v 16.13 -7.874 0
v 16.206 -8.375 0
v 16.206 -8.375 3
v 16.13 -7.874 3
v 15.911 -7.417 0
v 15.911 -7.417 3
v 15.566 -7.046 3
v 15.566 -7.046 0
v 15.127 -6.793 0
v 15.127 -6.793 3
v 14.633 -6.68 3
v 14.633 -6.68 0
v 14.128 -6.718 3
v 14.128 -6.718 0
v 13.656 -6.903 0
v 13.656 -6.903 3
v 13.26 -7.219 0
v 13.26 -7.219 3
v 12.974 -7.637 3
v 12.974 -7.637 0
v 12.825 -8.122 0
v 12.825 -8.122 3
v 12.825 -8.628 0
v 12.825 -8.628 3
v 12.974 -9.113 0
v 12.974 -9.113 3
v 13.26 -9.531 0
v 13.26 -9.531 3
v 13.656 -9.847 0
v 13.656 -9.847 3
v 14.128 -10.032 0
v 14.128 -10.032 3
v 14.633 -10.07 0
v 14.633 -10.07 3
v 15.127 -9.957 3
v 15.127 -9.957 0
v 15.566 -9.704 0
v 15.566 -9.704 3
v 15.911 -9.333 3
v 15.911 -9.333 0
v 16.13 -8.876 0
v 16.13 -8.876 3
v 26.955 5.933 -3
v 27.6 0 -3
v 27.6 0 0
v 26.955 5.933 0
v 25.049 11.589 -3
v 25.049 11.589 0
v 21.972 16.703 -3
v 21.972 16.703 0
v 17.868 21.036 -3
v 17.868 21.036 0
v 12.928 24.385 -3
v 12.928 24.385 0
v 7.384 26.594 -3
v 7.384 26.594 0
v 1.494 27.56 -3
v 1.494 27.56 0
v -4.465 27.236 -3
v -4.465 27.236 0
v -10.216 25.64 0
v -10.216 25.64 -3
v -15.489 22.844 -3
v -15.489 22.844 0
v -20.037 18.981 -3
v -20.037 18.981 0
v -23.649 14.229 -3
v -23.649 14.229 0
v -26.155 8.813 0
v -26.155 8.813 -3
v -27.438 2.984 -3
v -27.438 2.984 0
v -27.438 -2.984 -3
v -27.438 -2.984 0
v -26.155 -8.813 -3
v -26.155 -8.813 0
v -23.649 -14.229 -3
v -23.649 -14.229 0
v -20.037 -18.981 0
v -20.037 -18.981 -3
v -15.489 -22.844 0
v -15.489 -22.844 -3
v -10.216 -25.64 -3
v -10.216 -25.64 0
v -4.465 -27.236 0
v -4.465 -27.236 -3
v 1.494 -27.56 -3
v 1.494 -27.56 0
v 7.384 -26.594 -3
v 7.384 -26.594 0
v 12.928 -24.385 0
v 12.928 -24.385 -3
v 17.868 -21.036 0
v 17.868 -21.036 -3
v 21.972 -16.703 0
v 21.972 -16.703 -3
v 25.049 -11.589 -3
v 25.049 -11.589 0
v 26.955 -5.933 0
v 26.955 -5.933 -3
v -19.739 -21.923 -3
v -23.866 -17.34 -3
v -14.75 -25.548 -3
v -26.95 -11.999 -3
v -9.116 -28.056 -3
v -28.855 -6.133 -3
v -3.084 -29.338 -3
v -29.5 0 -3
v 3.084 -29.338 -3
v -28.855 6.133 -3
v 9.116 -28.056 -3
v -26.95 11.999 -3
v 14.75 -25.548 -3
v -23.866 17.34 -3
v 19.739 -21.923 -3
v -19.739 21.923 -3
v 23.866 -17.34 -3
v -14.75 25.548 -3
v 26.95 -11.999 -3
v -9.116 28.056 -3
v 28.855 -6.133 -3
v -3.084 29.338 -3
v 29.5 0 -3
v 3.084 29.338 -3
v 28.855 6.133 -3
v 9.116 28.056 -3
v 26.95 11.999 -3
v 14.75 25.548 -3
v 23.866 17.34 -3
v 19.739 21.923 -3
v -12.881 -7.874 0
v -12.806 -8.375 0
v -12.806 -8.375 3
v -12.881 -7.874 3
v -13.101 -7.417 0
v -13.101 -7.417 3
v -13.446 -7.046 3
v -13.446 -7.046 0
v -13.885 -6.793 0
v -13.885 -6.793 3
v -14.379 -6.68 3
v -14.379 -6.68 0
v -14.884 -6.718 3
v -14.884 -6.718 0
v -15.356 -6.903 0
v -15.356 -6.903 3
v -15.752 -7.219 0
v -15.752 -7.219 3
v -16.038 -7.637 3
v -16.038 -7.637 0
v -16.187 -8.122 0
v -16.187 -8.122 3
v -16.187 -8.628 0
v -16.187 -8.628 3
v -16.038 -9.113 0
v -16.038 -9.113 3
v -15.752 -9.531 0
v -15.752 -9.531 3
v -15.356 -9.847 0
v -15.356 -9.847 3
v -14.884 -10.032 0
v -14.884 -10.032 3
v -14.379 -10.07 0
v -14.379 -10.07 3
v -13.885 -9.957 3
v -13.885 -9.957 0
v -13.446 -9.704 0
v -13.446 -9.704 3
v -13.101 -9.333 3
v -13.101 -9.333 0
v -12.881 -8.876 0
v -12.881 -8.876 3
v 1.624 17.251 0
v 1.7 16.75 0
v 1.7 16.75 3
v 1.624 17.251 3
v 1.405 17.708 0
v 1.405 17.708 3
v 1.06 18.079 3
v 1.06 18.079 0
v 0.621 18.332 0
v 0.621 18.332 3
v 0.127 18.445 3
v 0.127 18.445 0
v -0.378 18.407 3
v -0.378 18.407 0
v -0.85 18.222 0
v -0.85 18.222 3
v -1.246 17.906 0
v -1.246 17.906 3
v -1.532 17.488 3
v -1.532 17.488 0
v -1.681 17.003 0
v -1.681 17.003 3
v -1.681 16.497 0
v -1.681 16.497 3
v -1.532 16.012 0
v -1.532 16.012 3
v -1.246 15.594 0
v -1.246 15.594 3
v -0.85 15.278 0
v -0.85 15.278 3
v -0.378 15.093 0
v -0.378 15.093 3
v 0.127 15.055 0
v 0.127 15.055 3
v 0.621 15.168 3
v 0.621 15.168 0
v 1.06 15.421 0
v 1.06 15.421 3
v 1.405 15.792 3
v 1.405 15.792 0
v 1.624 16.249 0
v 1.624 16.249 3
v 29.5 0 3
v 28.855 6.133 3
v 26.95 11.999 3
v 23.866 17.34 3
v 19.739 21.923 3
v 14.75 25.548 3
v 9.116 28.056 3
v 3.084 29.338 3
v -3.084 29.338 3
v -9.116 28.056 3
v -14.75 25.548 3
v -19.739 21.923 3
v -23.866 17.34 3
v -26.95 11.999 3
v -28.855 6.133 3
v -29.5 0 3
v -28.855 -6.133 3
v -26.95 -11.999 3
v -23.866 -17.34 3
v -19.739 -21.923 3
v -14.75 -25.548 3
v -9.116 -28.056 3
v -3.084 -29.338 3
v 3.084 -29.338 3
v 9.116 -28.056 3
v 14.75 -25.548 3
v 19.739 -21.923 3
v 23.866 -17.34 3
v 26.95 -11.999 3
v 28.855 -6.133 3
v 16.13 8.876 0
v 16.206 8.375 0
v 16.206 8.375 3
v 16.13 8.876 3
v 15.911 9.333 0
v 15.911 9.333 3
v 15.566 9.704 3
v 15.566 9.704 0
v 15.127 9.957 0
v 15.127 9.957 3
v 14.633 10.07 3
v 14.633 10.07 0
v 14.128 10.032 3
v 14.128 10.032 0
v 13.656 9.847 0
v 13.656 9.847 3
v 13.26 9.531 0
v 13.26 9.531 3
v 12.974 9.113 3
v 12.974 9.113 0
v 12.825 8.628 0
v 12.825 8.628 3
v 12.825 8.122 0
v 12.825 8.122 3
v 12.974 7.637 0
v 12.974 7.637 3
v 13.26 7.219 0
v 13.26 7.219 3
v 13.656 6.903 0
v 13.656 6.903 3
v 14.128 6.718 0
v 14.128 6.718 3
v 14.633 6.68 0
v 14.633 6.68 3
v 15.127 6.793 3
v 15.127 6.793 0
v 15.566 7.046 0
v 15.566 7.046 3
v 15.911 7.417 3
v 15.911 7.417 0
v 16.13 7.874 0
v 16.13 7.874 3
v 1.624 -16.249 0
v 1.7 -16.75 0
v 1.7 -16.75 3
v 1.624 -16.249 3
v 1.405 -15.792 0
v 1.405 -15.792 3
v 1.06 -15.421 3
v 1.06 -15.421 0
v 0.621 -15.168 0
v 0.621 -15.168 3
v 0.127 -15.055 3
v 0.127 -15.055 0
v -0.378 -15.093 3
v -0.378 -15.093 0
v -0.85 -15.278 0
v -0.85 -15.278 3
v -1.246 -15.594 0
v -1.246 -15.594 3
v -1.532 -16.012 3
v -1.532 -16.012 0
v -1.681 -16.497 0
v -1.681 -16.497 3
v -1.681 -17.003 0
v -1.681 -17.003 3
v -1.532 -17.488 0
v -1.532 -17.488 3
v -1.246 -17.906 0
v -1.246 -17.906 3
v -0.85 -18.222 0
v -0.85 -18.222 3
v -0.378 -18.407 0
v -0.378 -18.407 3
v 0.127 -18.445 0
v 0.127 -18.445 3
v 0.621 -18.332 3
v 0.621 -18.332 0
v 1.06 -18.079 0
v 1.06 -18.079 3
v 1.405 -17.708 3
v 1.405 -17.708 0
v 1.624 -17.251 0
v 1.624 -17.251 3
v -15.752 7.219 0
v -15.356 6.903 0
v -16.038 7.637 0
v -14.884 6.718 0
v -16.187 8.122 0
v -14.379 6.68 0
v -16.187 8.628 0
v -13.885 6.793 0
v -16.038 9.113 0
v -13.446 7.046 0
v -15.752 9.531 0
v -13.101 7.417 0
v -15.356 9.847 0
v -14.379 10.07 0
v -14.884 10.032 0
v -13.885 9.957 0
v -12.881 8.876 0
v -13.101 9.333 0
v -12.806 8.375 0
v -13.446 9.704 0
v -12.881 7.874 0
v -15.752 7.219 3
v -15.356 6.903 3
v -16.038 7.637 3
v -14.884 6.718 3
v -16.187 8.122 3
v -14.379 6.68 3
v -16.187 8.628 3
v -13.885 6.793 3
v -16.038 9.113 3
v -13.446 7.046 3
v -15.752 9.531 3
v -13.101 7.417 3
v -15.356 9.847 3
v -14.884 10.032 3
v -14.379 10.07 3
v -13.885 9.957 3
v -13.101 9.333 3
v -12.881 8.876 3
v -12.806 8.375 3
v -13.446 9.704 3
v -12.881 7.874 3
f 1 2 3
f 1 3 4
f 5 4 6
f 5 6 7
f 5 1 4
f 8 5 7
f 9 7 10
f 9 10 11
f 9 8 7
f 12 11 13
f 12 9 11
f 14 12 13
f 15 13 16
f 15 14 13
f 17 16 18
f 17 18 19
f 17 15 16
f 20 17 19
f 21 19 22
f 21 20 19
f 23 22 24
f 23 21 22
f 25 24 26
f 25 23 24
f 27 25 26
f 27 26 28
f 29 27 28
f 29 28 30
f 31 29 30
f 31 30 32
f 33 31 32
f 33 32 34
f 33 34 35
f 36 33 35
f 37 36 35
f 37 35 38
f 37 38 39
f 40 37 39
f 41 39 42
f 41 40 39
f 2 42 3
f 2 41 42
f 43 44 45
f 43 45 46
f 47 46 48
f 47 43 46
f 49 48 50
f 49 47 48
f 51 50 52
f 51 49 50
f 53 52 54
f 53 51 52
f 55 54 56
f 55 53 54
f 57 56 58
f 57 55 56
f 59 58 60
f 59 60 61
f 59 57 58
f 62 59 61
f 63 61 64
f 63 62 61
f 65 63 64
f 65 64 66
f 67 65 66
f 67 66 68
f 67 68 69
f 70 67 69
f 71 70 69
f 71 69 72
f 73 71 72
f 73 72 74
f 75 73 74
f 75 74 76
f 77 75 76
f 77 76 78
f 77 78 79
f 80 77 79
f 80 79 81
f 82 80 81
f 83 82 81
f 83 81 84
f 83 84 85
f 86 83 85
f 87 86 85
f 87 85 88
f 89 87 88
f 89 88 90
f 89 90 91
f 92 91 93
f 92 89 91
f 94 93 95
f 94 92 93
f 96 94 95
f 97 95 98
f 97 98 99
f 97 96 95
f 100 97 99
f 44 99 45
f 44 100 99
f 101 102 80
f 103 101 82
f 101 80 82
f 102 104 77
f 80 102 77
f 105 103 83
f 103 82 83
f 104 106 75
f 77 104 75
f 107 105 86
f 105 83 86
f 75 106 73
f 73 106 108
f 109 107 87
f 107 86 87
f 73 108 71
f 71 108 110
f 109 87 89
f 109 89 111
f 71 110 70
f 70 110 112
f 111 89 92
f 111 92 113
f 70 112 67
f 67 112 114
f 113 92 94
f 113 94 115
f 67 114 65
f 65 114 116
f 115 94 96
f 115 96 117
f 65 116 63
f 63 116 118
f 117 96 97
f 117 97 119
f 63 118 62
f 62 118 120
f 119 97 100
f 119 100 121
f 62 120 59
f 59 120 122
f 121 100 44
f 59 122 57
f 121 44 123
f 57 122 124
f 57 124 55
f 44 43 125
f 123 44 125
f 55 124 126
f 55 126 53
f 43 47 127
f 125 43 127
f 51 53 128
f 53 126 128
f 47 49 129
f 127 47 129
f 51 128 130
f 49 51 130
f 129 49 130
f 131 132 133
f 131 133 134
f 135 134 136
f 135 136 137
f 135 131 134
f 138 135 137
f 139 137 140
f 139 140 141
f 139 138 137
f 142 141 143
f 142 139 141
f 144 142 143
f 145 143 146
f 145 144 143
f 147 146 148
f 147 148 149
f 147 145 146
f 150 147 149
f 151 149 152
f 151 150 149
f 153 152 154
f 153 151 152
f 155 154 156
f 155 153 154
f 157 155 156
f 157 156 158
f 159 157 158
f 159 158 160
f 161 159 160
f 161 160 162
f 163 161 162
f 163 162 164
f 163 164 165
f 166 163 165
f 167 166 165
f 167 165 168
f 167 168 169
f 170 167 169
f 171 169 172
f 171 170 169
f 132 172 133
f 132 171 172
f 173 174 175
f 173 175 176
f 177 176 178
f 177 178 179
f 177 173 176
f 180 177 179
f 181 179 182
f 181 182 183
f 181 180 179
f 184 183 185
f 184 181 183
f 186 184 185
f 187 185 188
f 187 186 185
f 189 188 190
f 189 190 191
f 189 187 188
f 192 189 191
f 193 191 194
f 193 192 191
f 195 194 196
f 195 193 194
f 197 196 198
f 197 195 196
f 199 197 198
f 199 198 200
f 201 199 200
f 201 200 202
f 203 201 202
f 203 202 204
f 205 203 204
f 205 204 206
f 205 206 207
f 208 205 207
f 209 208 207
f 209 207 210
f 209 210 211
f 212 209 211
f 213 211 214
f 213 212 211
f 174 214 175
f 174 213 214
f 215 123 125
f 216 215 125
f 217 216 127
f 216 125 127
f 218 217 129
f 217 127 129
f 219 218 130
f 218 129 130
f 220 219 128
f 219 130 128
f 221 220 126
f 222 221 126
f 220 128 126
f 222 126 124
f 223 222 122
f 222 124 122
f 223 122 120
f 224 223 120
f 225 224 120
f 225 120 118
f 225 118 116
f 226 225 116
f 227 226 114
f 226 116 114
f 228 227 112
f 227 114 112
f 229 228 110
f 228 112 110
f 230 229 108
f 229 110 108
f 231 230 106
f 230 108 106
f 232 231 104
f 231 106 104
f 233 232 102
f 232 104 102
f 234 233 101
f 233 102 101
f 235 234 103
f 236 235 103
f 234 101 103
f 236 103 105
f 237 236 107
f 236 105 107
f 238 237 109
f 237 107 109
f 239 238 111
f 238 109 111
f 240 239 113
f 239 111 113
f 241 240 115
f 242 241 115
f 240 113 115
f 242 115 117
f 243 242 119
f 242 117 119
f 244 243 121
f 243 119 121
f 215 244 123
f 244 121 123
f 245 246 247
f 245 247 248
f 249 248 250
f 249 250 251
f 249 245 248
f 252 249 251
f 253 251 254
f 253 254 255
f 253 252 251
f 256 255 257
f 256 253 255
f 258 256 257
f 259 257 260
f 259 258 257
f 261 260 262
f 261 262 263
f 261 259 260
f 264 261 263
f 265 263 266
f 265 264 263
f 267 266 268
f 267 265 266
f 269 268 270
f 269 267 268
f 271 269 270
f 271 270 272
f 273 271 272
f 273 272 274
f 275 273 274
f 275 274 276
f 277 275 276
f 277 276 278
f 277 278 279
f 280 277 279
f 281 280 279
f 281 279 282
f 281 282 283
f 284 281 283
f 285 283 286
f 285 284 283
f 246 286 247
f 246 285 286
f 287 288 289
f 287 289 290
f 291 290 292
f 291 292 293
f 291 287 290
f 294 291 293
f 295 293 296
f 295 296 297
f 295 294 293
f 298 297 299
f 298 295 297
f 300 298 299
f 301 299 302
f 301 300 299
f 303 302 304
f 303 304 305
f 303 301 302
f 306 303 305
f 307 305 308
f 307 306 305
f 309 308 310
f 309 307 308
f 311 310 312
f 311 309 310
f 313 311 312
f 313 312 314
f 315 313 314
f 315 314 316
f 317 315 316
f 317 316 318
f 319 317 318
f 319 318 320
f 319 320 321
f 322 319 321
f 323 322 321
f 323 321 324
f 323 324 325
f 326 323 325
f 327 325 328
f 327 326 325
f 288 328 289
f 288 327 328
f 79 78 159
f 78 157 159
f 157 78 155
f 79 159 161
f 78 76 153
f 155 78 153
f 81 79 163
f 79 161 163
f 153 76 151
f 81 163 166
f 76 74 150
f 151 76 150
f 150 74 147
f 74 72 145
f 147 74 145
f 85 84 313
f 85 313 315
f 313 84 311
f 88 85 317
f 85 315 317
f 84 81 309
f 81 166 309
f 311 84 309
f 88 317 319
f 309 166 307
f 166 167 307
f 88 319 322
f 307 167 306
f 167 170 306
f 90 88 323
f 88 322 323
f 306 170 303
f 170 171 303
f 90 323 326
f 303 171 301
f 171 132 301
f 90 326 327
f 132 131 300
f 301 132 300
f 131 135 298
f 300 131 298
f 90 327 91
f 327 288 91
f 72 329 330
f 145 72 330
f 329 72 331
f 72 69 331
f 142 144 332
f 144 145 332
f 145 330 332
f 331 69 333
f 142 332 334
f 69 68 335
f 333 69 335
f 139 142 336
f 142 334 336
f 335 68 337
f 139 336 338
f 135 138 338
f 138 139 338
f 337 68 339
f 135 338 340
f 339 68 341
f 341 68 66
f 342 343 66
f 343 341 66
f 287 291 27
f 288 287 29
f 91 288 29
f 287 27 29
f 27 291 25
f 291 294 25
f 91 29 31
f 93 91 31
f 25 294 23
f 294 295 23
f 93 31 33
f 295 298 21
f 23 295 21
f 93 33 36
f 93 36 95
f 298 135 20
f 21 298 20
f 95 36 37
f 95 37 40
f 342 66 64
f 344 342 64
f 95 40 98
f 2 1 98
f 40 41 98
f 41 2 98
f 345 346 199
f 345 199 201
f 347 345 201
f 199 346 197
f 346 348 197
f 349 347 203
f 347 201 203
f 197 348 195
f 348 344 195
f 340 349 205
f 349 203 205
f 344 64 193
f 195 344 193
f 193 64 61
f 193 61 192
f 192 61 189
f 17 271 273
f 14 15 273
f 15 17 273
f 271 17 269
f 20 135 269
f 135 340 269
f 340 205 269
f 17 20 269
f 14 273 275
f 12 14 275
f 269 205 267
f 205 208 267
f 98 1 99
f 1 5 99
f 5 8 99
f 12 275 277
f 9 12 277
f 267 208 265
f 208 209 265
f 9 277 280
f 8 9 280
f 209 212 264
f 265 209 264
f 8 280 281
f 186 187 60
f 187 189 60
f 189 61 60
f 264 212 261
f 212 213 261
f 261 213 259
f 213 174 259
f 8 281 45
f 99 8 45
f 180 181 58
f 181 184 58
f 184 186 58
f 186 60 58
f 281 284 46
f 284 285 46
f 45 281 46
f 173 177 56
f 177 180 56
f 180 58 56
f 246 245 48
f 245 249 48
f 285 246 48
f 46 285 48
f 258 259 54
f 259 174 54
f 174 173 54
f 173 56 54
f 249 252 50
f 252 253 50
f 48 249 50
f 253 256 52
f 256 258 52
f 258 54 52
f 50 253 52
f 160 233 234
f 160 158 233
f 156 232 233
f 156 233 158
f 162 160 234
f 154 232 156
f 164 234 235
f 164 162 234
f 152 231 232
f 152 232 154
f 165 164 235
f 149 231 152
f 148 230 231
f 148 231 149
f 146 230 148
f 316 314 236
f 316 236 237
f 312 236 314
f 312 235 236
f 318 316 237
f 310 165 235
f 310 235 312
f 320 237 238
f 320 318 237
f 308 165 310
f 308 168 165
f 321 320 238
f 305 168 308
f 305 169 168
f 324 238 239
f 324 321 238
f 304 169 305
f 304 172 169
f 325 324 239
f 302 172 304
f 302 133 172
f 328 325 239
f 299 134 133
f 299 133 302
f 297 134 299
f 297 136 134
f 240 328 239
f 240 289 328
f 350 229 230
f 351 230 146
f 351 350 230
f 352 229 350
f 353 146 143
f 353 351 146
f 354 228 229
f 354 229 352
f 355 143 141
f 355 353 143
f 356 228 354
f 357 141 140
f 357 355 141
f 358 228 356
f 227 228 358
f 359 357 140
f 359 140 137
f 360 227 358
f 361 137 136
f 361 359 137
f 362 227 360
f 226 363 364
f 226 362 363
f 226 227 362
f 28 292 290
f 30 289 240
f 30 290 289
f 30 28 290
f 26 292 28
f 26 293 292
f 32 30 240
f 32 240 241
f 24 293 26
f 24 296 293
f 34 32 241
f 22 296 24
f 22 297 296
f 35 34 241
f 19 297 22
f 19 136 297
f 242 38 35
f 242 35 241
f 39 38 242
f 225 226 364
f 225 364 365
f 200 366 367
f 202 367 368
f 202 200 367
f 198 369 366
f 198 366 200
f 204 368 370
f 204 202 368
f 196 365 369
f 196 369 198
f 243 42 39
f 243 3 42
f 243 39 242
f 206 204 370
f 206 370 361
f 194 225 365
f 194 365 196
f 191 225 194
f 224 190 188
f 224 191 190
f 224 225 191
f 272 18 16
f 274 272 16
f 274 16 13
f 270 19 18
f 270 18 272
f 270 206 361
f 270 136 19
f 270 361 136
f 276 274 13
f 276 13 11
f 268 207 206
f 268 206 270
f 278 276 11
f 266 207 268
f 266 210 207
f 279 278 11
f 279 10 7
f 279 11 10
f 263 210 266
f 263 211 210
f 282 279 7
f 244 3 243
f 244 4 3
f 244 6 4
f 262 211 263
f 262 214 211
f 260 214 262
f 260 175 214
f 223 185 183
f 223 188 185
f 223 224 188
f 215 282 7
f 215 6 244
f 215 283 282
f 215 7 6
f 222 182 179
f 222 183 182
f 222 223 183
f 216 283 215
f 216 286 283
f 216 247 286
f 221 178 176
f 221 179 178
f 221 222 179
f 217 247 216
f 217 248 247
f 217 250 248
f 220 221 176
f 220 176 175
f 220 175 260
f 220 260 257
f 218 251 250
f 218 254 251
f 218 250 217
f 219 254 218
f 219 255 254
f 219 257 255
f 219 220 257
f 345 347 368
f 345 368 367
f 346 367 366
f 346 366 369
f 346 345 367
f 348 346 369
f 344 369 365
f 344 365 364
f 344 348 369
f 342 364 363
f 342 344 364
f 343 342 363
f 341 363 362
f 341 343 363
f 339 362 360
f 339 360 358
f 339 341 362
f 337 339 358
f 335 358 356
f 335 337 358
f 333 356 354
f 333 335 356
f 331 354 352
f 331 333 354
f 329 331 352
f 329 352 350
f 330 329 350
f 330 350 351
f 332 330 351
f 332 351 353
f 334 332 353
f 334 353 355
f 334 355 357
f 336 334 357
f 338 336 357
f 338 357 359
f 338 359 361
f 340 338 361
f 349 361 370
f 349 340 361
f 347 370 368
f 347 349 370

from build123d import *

# Parameters (mm, degrees)
SKETCH_1_R      = 27.6
SKETCH_1_R_2    = 1.7
EXTRUDE_1_DEPTH = 3
EXTRUDE_START   = -6
SKETCH_2_R      = 29.5
SKETCH_2_R_2    = 27.6
EXTRUDE_2_DEPTH = 6


with BuildPart() as part:
    # 草图1 → 凸台-拉伸1 (new body)
    with BuildSketch(Plane.XY):
        Circle(SKETCH_1_R)
        with Locations((-14.505925513, -8.375)):
            Circle(SKETCH_1_R_2, mode=Mode.SUBTRACT)
        with Locations((-14.505925513, 8.375)):
            Circle(SKETCH_1_R_2, mode=Mode.SUBTRACT)
        with Locations((0, 16.75)):
            Circle(SKETCH_1_R_2, mode=Mode.SUBTRACT)
        with Locations((14.505925513, 8.375)):
            Circle(SKETCH_1_R_2, mode=Mode.SUBTRACT)
        with Locations((14.505925513, -8.375)):
            Circle(SKETCH_1_R_2, mode=Mode.SUBTRACT)
        with Locations((0, -16.75)):
            Circle(SKETCH_1_R_2, mode=Mode.SUBTRACT)
    extrude(amount=EXTRUDE_1_DEPTH)

    # 草图2 → 凸台-拉伸2 (add)
    with BuildSketch(Plane.XY.offset(3).offset(EXTRUDE_START)):
        Circle(SKETCH_2_R)
        Circle(SKETCH_2_R_2, mode=Mode.SUBTRACT)
    extrude(amount=EXTRUDE_2_DEPTH)


solid = part.part
